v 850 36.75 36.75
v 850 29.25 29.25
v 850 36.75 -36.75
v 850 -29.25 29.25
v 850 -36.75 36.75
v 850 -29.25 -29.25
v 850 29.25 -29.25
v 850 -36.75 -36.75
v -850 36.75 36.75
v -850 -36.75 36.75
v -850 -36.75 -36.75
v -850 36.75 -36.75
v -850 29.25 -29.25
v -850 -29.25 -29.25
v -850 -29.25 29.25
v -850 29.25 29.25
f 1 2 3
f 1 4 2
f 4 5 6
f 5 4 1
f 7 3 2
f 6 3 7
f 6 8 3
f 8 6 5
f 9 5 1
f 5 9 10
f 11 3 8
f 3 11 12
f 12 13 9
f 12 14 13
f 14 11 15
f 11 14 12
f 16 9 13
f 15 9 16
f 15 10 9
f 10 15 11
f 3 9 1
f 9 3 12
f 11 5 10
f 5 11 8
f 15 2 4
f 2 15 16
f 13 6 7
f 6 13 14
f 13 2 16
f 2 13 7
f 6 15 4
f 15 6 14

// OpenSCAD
/*
ssqa module{
dependent from full length
this module in particular needs to be customizable
integrated with the squares
}
*/

// INDEPENDENT VARIABLES
/* Tynes Subassemblies parameters*/
l=1700;// width of grapples
tynes_num=10;//ammmount of inner tynes
sh_thick=5; // Sheet thickness

/*Lid Parameters*/
l_lid=620;

// DEPENDENT VARIABLES**DON'T CHANGE**
d_b_tynes=l/tynes_num;// distance between tynes recalculation
l_ratio=(l_lid-l_lid*0.07)/450;// Recalculation of front and up plate based on original size


module sq_tube(length,size){
	difference(length,size) {
		cube([length,size*24.5,size*24.5], center=true);
		cube([length+length*0.2, size*(24.5)-15, size*(24.5)-15], center=true);
	}
}

sq_tube(l,3);
